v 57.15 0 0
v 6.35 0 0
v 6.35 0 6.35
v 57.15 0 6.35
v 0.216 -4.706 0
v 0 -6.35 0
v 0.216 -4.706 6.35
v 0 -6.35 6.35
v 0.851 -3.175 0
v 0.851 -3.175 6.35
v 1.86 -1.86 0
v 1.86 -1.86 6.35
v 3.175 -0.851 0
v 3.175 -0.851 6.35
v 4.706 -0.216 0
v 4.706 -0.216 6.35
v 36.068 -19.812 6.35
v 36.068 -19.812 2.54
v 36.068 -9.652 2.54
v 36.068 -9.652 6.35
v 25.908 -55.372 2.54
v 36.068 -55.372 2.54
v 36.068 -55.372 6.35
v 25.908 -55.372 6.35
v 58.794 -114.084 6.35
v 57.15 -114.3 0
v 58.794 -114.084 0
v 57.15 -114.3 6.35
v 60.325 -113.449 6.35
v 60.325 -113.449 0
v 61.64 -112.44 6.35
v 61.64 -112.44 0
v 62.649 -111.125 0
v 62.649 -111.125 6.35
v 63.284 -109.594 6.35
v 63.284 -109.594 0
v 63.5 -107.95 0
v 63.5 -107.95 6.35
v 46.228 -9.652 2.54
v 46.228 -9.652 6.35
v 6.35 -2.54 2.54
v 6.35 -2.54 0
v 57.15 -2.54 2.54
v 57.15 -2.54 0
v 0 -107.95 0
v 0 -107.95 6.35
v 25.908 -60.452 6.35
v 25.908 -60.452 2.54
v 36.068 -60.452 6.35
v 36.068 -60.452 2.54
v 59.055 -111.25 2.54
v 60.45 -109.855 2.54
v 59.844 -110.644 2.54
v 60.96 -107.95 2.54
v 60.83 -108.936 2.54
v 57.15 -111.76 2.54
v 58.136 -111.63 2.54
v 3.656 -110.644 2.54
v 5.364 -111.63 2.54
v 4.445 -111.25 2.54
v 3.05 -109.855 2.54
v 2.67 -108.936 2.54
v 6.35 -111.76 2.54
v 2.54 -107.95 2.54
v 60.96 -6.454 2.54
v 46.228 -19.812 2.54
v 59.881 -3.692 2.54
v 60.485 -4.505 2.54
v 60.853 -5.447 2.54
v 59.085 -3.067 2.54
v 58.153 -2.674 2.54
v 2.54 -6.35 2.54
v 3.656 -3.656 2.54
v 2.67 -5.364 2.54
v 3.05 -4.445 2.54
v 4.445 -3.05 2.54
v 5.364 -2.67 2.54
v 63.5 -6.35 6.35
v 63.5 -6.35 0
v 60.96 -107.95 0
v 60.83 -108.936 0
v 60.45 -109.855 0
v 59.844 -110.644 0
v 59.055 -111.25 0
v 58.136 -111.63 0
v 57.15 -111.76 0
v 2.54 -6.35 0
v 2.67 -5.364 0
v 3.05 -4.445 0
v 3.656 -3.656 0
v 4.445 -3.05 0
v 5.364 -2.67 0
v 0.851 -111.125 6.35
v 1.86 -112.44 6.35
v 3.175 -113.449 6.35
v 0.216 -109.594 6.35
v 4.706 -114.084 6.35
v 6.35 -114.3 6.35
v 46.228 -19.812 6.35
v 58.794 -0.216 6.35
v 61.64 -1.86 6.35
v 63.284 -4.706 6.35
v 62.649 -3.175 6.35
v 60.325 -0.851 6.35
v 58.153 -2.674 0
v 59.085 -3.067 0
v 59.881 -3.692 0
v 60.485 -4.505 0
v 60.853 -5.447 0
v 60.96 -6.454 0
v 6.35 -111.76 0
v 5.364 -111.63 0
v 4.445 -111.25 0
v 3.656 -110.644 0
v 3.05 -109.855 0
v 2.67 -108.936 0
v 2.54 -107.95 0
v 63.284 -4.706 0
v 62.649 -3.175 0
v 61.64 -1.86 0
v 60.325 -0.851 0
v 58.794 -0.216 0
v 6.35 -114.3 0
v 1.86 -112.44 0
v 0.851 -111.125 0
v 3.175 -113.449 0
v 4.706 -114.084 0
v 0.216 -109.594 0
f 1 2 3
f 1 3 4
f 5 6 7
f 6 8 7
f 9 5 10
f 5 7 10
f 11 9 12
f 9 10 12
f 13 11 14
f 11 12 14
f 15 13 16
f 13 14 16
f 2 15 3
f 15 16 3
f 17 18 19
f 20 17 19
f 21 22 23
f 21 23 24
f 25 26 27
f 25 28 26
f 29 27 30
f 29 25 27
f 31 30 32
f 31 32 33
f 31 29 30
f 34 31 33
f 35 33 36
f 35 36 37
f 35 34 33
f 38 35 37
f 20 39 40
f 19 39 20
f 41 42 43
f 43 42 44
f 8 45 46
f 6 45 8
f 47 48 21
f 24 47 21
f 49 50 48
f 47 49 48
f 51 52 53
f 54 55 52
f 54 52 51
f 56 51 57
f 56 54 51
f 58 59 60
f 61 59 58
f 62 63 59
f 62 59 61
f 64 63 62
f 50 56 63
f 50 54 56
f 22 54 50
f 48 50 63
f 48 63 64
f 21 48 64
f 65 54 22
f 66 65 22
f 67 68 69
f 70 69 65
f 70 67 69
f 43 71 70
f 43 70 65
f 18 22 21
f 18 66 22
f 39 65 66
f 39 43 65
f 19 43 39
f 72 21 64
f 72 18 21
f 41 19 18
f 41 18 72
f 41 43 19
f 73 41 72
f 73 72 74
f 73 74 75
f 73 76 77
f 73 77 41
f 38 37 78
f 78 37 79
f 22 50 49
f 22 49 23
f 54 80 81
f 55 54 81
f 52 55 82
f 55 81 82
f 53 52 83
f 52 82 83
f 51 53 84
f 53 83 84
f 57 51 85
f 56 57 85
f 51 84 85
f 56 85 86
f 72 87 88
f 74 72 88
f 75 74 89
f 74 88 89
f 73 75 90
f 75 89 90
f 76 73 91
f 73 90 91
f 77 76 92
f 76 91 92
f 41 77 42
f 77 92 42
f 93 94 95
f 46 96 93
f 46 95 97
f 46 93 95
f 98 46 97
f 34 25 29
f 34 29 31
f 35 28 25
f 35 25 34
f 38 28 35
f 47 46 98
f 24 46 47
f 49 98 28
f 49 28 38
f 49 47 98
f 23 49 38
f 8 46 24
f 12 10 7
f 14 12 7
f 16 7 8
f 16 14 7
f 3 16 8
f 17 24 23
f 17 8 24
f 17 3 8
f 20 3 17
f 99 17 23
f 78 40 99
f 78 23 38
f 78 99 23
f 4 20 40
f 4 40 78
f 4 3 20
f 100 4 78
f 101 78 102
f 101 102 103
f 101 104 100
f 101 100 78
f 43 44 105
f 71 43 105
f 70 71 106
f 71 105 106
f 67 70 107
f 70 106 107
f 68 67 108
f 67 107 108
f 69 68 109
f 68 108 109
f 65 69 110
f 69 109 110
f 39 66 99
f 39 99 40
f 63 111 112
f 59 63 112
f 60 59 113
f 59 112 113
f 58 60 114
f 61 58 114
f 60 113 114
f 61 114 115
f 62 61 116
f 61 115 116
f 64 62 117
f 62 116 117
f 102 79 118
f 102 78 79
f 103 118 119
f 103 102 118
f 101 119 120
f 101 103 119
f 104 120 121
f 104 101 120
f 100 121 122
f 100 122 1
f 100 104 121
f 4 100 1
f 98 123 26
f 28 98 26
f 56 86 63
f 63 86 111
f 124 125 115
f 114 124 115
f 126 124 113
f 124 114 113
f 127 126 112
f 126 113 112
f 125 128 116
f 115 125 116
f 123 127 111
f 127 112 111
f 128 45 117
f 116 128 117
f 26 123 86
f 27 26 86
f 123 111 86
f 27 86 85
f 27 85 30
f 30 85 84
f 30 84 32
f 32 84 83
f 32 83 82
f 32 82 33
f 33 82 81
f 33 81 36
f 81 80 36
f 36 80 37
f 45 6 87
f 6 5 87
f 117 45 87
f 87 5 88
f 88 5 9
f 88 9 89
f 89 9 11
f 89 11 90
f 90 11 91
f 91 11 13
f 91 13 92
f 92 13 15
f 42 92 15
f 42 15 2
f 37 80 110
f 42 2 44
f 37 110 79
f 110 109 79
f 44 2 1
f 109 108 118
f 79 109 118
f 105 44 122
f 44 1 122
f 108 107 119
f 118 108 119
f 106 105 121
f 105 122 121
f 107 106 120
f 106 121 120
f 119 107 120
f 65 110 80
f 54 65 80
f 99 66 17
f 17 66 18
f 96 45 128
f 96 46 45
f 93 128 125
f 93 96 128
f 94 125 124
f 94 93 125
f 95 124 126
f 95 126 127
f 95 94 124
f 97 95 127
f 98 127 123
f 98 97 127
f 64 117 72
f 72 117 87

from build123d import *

# Parameters (mm, degrees)
SKETCH2_W           = 63.5
SKETCH2_H           = 114.3
BOSS_EXTRUDE1_DEPTH = 6.35
FILLET1_R           = 6.35
CUT_EXTRUDE2_DEPTH  = 2.54
SKETCH8_W           = 10.16
SKETCH8_H           = 10.16
CUT_EXTRUDE3_DEPTH  = 131.81
SKETCH7_W           = 10.16
SKETCH7_H           = 5.08
CUT_EXTRUDE4_DEPTH  = 131.81


with BuildPart() as part:
    # Sketch2 → Boss-Extrude1 (new body)
    with BuildSketch(Plane.XY):
        with Locations((31.75, -57.15)):
            Rectangle(SKETCH2_W, SKETCH2_H)
    extrude(amount=BOSS_EXTRUDE1_DEPTH)

    # Fillet1
    fillet1_edges = [part.edges().sort_by_distance(p)[0] for p in [
        (0, 0, 3.175),
        (63.5, 0, 3.175),
        (63.5, -114.3, 3.175),
        (0, -114.3, 3.175),
    ]]
    fillet(fillet1_edges, radius=FILLET1_R)

    # Sketch5 → Cut-Extrude2 (cut)
    with BuildSketch(Plane(origin=(0, 0, 0), x_dir=(-1, 0, 0), z_dir=(0, 0, -1))):
        with BuildLine():
            Line((-60.96, -6.453652416), (-60.96, -107.95))
            ThreePointArc((-60.96, -107.95), (-59.844076836, -110.644076836), (-57.15, -111.76))
            Line((-57.15, -111.76), (-6.35, -111.76))
            ThreePointArc((-6.35, -111.76), (-3.655923164, -110.644076836), (-2.54, -107.95))
            Line((-2.54, -107.95), (-2.54, -6.35))
            ThreePointArc((-2.54, -6.35), (-3.655923164, -3.655923164), (-6.35, -2.54))
            Line((-6.35, -2.54), (-57.15, -2.54))
            ThreePointArc((-57.15, -2.54), (-59.881396091, -3.692317076), (-60.96, -6.453652416))
        make_face()
    extrude(amount=-CUT_EXTRUDE2_DEPTH, mode=Mode.SUBTRACT)

    # Sketch8 → Cut-Extrude3 (cut, through all)
    with BuildSketch(Plane(origin=(0, 0, 2.54), x_dir=(-1, 0, 0), z_dir=(0, 0, -1))):
        with Locations((-41.148, -14.732)):
            Rectangle(SKETCH8_W, SKETCH8_H)
    extrude(amount=-CUT_EXTRUDE3_DEPTH, mode=Mode.SUBTRACT)

    # Sketch7 → Cut-Extrude4 (cut, through all)
    with BuildSketch(Plane(origin=(0, 0, 2.54), x_dir=(-1, 0, 0), z_dir=(0, 0, -1))):
        with Locations((-30.988, -57.912)):
            Rectangle(SKETCH7_W, SKETCH7_H)
    extrude(amount=-CUT_EXTRUDE4_DEPTH, mode=Mode.SUBTRACT)


solid = part.part
